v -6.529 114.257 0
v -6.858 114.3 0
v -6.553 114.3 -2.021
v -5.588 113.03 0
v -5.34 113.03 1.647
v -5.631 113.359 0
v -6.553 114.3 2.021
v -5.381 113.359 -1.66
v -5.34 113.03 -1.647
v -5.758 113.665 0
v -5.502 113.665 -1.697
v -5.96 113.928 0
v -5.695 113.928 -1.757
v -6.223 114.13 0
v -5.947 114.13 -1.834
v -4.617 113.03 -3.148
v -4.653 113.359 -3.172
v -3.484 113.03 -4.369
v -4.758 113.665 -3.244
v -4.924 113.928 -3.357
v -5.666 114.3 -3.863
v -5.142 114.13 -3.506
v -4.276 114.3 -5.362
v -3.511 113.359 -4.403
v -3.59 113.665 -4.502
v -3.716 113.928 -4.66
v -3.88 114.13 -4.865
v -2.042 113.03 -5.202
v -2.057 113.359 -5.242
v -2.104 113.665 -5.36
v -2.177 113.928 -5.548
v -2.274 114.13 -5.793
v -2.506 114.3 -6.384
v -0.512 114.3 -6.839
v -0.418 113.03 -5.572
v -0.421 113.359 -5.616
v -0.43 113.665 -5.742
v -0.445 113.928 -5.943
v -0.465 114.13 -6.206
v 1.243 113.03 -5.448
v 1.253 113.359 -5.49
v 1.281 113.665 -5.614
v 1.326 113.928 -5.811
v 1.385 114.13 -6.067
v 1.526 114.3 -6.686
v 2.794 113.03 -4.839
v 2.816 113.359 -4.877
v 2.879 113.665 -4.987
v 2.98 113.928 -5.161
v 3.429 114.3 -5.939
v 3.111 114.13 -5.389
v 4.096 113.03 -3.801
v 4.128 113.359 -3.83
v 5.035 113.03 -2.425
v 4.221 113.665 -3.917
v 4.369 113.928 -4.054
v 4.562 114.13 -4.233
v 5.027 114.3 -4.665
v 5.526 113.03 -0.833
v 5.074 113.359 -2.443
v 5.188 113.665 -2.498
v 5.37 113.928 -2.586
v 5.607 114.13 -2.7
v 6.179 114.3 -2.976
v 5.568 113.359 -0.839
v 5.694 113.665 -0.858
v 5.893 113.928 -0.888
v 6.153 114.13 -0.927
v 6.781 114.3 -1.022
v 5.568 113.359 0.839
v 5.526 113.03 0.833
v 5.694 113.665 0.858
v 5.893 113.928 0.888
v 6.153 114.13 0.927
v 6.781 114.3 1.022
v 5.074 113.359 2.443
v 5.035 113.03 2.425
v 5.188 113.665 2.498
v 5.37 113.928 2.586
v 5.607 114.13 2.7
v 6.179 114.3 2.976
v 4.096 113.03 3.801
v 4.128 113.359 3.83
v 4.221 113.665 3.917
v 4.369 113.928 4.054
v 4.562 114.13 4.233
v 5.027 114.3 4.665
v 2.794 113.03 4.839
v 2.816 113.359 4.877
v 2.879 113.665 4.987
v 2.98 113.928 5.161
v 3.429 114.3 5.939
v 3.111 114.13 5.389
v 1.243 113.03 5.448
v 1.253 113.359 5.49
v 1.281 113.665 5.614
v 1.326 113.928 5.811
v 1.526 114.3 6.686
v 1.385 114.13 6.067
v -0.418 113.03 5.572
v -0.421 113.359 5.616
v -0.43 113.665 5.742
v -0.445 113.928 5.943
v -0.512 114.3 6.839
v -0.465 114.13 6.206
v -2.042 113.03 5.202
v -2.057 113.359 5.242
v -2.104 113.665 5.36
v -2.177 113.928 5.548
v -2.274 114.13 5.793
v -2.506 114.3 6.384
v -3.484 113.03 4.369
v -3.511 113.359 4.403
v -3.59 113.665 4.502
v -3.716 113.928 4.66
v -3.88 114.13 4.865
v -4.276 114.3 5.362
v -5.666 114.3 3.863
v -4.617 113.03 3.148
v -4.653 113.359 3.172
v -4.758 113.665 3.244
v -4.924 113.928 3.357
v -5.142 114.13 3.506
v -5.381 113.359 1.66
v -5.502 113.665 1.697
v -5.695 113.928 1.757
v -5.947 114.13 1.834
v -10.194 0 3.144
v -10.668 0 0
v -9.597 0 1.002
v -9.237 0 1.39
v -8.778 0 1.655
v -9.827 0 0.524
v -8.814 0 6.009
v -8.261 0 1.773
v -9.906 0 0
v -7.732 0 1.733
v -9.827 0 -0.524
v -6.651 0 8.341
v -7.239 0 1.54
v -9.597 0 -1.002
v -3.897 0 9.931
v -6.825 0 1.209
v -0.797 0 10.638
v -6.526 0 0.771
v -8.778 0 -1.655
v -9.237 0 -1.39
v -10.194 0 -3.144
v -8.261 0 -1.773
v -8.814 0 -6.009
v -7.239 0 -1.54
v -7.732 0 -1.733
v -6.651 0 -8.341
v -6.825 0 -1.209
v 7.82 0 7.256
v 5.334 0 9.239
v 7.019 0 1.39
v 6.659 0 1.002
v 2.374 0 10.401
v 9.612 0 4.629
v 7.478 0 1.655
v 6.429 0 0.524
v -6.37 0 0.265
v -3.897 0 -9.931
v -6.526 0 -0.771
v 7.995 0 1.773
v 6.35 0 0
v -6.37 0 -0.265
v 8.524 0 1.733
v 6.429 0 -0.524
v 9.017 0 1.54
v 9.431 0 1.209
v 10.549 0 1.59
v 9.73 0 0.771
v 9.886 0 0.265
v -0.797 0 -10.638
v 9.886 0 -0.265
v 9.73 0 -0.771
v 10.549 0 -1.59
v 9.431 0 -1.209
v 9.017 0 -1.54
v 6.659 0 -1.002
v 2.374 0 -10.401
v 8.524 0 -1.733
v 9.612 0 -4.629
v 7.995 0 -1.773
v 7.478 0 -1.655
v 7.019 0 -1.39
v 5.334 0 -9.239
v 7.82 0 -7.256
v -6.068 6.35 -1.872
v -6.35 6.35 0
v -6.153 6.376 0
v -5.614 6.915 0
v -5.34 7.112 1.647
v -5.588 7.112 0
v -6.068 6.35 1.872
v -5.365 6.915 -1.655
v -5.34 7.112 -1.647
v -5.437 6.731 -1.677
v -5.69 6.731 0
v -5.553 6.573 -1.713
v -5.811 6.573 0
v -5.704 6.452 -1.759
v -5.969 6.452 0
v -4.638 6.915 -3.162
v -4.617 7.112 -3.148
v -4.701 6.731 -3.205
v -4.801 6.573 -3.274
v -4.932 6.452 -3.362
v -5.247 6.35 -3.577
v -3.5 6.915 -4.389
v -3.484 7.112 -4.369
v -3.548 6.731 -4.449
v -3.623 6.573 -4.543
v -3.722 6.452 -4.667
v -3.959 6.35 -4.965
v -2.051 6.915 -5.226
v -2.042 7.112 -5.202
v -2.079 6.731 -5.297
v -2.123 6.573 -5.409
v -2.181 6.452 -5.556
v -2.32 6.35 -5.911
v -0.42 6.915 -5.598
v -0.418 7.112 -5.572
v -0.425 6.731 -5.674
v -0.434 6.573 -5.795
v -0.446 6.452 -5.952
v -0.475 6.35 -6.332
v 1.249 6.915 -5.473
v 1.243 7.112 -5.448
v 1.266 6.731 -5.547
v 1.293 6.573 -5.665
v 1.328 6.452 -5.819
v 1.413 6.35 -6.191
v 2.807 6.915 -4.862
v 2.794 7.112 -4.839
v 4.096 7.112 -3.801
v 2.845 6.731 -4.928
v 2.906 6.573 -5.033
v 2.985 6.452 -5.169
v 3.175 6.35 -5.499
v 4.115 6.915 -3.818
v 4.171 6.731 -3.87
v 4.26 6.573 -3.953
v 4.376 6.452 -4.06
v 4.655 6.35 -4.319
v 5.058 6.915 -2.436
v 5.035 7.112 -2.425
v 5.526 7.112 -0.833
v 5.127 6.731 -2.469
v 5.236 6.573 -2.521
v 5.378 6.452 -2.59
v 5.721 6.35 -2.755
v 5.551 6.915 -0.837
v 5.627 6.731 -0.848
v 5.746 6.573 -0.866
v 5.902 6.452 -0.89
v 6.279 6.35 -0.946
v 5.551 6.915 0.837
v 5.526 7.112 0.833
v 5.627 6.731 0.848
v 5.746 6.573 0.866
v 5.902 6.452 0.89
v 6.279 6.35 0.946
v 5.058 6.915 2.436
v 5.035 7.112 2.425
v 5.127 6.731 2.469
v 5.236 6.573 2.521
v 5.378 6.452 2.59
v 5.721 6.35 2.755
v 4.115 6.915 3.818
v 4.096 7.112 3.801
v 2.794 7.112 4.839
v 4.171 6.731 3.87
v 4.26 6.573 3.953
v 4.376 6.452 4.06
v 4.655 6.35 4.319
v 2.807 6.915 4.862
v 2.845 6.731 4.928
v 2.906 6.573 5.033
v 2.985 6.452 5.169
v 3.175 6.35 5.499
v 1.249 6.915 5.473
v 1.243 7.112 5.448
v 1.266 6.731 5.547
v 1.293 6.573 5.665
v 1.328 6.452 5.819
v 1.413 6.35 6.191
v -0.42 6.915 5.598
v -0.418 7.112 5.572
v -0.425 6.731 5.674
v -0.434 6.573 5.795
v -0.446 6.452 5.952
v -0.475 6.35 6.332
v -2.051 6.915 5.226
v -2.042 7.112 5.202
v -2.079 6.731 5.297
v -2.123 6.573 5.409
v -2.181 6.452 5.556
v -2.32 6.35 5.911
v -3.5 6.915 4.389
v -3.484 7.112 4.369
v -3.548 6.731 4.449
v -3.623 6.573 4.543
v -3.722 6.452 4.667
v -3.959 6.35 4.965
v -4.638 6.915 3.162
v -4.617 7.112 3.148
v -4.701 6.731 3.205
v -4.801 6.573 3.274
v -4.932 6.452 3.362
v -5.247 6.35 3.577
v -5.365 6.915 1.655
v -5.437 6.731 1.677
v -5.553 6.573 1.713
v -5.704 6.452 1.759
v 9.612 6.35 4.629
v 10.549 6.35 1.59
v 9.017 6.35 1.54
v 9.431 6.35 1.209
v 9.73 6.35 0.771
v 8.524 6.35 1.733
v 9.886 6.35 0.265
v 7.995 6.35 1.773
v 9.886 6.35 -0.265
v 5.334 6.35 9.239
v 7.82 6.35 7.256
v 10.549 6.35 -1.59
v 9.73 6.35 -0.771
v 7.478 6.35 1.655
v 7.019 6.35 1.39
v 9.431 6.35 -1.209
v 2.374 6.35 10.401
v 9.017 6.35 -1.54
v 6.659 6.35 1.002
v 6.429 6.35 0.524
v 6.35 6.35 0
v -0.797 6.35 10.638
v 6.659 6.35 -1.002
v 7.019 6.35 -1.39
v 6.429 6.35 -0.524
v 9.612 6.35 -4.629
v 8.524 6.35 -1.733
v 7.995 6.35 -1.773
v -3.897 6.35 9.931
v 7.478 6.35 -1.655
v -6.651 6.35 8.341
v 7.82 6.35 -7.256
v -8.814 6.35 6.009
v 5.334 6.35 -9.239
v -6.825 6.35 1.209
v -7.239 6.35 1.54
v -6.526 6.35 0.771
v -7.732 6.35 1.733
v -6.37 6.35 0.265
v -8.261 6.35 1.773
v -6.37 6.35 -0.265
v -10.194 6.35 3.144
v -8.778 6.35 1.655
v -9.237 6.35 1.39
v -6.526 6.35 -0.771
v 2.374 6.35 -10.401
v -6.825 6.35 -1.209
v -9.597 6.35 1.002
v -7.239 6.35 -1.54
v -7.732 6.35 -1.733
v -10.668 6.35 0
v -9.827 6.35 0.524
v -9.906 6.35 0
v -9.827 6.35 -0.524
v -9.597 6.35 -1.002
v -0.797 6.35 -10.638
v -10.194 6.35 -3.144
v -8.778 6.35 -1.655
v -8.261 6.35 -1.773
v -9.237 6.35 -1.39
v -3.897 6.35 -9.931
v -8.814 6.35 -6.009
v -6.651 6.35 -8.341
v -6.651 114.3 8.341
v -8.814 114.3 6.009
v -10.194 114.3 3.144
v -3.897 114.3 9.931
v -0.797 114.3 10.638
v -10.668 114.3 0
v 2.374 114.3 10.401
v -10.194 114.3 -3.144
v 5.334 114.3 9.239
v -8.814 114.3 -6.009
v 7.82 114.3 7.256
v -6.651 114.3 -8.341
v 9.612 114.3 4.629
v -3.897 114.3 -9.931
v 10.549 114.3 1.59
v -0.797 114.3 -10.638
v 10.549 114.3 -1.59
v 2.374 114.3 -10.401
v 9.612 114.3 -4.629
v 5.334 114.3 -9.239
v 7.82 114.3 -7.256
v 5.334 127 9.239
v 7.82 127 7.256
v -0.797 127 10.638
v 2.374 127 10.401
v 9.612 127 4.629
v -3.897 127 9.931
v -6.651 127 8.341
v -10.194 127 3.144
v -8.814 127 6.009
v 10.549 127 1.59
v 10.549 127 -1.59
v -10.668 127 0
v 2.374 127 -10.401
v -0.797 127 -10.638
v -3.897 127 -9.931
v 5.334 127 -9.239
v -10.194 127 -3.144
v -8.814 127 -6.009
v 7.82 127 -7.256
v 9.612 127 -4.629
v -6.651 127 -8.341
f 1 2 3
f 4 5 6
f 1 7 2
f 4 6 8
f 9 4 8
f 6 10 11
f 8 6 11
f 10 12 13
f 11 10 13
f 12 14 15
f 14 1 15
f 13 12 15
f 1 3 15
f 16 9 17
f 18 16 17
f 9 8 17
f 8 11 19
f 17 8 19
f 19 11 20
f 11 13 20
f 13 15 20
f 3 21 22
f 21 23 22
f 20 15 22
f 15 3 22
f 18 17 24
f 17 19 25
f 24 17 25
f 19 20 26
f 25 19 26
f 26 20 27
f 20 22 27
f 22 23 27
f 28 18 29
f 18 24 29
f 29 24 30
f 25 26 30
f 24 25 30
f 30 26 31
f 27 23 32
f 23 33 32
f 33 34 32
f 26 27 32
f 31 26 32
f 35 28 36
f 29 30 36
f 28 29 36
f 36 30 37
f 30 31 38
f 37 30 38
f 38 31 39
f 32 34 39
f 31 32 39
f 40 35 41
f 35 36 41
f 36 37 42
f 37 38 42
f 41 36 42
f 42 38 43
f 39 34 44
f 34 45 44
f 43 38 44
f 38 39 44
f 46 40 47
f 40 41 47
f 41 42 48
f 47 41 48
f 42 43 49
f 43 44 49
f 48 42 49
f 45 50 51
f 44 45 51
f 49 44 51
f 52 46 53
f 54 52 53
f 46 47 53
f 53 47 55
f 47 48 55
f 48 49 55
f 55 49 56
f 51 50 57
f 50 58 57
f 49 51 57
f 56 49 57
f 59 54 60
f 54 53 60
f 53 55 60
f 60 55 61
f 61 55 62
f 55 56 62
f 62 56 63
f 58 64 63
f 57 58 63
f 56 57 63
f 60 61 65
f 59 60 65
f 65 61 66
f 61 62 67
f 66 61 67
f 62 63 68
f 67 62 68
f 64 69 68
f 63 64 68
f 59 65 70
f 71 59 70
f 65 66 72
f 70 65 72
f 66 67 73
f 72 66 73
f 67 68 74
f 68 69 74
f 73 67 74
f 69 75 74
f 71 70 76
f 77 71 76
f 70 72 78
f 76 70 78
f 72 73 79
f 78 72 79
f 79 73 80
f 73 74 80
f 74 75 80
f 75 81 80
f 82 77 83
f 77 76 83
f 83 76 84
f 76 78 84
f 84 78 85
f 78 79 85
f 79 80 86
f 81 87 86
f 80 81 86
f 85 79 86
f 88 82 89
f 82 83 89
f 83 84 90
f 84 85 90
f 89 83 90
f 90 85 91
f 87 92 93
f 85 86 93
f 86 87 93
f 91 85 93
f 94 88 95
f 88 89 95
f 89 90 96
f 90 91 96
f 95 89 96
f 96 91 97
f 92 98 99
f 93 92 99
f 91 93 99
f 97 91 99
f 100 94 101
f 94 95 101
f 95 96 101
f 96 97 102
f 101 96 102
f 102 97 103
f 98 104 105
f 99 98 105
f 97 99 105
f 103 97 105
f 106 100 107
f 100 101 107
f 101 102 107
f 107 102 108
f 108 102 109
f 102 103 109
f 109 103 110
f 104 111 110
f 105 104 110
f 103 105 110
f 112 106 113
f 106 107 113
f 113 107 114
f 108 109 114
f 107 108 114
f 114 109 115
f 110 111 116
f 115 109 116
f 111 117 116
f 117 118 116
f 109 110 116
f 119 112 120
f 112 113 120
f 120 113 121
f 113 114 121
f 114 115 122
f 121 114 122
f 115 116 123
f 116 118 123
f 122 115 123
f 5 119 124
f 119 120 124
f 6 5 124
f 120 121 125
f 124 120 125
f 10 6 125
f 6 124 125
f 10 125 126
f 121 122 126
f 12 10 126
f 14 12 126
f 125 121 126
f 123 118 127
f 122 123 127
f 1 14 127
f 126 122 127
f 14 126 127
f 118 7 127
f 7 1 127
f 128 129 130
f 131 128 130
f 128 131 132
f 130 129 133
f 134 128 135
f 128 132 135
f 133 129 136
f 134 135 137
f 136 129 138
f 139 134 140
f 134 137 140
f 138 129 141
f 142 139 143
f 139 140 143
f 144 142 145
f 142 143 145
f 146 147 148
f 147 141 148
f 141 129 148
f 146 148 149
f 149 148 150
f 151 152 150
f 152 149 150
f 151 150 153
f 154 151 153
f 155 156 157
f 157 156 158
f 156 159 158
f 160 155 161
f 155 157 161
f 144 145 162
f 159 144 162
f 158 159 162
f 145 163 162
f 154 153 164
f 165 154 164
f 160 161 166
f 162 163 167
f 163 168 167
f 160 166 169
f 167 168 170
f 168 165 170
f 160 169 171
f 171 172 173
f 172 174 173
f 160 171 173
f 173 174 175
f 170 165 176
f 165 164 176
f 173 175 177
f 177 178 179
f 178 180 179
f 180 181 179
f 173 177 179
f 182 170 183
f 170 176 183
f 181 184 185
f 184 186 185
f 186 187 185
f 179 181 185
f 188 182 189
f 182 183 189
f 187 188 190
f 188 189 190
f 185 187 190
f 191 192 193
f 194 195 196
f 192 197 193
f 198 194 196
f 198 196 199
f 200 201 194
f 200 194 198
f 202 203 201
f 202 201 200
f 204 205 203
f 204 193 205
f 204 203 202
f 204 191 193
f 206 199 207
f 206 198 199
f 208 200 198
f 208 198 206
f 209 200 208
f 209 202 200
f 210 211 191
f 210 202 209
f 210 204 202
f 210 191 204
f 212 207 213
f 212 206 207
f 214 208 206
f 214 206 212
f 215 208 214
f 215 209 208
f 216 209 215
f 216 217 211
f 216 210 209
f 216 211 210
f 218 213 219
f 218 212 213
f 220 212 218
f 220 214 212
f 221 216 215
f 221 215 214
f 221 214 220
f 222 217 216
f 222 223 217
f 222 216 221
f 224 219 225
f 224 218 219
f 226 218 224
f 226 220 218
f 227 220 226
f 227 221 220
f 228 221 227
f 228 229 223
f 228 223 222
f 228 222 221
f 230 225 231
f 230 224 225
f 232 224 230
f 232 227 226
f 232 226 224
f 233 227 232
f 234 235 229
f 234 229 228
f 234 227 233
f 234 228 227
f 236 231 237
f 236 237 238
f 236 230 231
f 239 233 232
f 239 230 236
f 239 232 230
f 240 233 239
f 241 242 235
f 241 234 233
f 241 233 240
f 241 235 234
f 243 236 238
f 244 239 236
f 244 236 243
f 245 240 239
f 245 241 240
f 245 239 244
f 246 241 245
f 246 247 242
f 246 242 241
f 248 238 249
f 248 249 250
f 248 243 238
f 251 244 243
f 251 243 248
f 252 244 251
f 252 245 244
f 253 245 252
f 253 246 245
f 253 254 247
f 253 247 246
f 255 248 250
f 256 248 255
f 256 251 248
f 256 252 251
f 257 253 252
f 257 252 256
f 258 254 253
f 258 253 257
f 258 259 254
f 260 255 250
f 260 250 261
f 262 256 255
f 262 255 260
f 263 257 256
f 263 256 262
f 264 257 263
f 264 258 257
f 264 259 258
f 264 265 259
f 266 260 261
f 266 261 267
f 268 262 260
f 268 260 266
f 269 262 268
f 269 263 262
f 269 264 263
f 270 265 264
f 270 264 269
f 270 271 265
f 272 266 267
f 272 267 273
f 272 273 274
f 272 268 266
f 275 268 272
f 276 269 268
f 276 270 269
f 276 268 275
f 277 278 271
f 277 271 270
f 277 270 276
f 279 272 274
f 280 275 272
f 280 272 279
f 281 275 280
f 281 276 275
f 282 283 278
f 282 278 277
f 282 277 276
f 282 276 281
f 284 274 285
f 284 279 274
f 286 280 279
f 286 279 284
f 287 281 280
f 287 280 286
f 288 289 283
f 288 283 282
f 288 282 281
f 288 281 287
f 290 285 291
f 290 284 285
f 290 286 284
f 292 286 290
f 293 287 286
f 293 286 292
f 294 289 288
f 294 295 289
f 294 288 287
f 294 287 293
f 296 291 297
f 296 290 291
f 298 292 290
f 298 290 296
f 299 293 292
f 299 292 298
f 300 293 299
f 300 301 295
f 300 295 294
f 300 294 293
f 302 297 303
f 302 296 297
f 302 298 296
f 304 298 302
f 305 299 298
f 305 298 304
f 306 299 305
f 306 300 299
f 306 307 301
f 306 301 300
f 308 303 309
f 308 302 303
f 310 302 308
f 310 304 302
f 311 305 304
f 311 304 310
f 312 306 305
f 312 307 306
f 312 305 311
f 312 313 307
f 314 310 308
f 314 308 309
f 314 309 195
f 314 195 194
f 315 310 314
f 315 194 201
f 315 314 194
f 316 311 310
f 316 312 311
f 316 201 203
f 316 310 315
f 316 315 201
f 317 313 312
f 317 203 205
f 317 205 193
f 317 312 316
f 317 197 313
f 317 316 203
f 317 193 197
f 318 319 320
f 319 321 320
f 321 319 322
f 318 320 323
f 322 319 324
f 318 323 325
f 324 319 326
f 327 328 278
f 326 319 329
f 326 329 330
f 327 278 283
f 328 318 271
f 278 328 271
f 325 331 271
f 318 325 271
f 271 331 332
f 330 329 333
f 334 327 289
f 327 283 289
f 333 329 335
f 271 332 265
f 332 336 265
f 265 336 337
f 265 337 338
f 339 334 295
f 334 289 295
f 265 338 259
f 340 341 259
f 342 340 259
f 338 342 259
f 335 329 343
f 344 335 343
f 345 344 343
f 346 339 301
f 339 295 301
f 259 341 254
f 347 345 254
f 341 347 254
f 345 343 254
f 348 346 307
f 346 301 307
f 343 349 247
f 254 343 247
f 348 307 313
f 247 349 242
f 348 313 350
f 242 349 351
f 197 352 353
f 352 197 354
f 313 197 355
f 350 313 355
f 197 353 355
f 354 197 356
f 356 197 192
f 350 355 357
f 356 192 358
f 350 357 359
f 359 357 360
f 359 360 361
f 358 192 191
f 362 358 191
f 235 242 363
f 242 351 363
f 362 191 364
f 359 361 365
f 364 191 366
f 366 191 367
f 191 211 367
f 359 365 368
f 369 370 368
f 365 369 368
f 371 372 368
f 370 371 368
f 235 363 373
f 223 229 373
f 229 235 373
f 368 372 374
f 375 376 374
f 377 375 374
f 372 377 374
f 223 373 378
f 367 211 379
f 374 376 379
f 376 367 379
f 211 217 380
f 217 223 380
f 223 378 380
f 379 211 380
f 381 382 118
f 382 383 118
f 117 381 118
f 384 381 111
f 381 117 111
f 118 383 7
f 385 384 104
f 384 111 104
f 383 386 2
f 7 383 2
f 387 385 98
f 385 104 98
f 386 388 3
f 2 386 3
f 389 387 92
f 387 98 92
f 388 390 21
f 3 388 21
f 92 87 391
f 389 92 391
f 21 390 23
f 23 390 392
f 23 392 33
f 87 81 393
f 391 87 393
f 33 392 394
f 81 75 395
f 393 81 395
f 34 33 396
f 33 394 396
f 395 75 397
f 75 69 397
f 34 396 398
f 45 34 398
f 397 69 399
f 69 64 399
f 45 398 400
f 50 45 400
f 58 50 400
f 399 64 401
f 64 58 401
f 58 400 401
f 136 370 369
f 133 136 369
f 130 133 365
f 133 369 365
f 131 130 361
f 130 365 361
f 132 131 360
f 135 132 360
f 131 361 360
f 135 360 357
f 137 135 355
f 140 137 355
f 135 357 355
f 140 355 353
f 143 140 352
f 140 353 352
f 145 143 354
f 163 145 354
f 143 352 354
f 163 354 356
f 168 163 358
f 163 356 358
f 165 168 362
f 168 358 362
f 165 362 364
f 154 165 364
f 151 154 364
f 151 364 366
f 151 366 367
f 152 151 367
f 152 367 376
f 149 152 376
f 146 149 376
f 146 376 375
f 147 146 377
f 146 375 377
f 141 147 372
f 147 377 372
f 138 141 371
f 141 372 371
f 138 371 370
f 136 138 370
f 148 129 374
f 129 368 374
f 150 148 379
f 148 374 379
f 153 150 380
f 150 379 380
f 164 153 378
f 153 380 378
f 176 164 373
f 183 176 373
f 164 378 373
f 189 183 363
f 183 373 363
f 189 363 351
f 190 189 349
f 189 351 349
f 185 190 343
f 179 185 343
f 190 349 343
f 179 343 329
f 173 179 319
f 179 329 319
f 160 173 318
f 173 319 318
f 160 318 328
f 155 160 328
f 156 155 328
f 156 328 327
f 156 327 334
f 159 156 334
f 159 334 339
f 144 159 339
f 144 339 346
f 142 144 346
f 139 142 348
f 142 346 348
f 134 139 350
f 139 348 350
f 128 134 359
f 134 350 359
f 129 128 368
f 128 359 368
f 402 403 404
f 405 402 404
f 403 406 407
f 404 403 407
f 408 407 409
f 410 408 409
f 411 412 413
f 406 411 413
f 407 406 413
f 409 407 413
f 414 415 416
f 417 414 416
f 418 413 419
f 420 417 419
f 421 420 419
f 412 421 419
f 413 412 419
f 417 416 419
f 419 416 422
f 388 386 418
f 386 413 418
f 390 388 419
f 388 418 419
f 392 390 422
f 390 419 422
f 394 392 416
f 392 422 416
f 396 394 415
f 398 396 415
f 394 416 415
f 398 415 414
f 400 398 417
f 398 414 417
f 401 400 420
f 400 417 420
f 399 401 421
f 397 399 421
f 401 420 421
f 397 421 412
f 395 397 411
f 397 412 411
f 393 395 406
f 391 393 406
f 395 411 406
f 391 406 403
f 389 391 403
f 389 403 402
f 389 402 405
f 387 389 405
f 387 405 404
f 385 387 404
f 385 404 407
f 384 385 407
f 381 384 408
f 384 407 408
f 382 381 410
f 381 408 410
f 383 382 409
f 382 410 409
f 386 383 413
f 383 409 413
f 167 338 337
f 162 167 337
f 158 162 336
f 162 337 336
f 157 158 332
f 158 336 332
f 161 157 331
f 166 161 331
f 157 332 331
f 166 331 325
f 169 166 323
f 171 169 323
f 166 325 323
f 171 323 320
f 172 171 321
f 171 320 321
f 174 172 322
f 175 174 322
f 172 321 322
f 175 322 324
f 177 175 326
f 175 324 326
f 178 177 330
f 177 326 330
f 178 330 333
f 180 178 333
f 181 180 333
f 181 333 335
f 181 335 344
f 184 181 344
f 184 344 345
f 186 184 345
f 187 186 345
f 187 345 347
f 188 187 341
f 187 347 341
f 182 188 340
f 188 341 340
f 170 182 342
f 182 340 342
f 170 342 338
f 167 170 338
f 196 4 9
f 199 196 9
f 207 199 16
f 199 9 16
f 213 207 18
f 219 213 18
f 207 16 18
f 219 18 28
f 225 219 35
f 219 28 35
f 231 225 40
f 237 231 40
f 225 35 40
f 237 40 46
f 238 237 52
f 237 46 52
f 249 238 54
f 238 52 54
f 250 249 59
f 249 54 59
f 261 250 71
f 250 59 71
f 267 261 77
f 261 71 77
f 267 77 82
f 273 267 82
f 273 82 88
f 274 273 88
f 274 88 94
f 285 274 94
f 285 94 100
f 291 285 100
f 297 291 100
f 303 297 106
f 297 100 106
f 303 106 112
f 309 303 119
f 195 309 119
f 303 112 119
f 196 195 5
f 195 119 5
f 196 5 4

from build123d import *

# Parameters (mm, degrees)
SKETCH2_R          = 1.7779999999999996
CUT_EXTRUDE1_DEPTH = 6.35
FILLET1_R          = 1.27
FILLET2_R          = 0.762


with BuildPart() as part:
    # Sketch1 → Revolve1 (revolve)
    with BuildSketch(Plane.XY, mode=Mode.PRIVATE) as revolve1_sk:
        Polygon((0, 0), (10.668, 0), (10.668000000000001, 6.35), (5.588, 6.349999999999999), (5.588, 114.30000000000001), (10.668000000000001, 114.3), (10.668, 127), (-1.12e-14, 127), align=None)
    revolve(revolve1_sk.sketch.rotate(Axis((-1.12e-14, 127, 0), (9e-17, -1, 0)), 180), axis=Axis((-1.12e-14, 127, 0), (9e-17, -1, 0)))

    # Sketch2 → Cut-Extrude1 (cut)
    with BuildSketch(Plane(origin=(-5.6e-16, 6.349999999999999, 0), x_dir=(1, -1.7e-16, 0), z_dir=(1.7e-16, 1, 0))):
        with Locations(Location((-8.128000000000021, -4.5e-16, 0), (0, 0, 180))):
            Circle(SKETCH2_R)
        with Locations(Location((8.128000000000021, -4.5e-16, 0), (0, 0, 180))):
            Circle(SKETCH2_R)
    extrude(amount=-CUT_EXTRUDE1_DEPTH, mode=Mode.SUBTRACT)

    # Fillet1
    fillet1_edges = [part.edges().sort_by_distance(p)[0] for p in [
        (5.588000000000001, 114.30000000000001, -1.37e-15),
    ]]
    fillet(fillet1_edges, radius=FILLET1_R)

    # Fillet2
    fillet2_edges = [part.edges().sort_by_distance(p)[0] for p in [
        (5.587999999999999, 6.349999999999995, -3.85e-15),
    ]]
    fillet(fillet2_edges, radius=FILLET2_R)


solid = part.part
